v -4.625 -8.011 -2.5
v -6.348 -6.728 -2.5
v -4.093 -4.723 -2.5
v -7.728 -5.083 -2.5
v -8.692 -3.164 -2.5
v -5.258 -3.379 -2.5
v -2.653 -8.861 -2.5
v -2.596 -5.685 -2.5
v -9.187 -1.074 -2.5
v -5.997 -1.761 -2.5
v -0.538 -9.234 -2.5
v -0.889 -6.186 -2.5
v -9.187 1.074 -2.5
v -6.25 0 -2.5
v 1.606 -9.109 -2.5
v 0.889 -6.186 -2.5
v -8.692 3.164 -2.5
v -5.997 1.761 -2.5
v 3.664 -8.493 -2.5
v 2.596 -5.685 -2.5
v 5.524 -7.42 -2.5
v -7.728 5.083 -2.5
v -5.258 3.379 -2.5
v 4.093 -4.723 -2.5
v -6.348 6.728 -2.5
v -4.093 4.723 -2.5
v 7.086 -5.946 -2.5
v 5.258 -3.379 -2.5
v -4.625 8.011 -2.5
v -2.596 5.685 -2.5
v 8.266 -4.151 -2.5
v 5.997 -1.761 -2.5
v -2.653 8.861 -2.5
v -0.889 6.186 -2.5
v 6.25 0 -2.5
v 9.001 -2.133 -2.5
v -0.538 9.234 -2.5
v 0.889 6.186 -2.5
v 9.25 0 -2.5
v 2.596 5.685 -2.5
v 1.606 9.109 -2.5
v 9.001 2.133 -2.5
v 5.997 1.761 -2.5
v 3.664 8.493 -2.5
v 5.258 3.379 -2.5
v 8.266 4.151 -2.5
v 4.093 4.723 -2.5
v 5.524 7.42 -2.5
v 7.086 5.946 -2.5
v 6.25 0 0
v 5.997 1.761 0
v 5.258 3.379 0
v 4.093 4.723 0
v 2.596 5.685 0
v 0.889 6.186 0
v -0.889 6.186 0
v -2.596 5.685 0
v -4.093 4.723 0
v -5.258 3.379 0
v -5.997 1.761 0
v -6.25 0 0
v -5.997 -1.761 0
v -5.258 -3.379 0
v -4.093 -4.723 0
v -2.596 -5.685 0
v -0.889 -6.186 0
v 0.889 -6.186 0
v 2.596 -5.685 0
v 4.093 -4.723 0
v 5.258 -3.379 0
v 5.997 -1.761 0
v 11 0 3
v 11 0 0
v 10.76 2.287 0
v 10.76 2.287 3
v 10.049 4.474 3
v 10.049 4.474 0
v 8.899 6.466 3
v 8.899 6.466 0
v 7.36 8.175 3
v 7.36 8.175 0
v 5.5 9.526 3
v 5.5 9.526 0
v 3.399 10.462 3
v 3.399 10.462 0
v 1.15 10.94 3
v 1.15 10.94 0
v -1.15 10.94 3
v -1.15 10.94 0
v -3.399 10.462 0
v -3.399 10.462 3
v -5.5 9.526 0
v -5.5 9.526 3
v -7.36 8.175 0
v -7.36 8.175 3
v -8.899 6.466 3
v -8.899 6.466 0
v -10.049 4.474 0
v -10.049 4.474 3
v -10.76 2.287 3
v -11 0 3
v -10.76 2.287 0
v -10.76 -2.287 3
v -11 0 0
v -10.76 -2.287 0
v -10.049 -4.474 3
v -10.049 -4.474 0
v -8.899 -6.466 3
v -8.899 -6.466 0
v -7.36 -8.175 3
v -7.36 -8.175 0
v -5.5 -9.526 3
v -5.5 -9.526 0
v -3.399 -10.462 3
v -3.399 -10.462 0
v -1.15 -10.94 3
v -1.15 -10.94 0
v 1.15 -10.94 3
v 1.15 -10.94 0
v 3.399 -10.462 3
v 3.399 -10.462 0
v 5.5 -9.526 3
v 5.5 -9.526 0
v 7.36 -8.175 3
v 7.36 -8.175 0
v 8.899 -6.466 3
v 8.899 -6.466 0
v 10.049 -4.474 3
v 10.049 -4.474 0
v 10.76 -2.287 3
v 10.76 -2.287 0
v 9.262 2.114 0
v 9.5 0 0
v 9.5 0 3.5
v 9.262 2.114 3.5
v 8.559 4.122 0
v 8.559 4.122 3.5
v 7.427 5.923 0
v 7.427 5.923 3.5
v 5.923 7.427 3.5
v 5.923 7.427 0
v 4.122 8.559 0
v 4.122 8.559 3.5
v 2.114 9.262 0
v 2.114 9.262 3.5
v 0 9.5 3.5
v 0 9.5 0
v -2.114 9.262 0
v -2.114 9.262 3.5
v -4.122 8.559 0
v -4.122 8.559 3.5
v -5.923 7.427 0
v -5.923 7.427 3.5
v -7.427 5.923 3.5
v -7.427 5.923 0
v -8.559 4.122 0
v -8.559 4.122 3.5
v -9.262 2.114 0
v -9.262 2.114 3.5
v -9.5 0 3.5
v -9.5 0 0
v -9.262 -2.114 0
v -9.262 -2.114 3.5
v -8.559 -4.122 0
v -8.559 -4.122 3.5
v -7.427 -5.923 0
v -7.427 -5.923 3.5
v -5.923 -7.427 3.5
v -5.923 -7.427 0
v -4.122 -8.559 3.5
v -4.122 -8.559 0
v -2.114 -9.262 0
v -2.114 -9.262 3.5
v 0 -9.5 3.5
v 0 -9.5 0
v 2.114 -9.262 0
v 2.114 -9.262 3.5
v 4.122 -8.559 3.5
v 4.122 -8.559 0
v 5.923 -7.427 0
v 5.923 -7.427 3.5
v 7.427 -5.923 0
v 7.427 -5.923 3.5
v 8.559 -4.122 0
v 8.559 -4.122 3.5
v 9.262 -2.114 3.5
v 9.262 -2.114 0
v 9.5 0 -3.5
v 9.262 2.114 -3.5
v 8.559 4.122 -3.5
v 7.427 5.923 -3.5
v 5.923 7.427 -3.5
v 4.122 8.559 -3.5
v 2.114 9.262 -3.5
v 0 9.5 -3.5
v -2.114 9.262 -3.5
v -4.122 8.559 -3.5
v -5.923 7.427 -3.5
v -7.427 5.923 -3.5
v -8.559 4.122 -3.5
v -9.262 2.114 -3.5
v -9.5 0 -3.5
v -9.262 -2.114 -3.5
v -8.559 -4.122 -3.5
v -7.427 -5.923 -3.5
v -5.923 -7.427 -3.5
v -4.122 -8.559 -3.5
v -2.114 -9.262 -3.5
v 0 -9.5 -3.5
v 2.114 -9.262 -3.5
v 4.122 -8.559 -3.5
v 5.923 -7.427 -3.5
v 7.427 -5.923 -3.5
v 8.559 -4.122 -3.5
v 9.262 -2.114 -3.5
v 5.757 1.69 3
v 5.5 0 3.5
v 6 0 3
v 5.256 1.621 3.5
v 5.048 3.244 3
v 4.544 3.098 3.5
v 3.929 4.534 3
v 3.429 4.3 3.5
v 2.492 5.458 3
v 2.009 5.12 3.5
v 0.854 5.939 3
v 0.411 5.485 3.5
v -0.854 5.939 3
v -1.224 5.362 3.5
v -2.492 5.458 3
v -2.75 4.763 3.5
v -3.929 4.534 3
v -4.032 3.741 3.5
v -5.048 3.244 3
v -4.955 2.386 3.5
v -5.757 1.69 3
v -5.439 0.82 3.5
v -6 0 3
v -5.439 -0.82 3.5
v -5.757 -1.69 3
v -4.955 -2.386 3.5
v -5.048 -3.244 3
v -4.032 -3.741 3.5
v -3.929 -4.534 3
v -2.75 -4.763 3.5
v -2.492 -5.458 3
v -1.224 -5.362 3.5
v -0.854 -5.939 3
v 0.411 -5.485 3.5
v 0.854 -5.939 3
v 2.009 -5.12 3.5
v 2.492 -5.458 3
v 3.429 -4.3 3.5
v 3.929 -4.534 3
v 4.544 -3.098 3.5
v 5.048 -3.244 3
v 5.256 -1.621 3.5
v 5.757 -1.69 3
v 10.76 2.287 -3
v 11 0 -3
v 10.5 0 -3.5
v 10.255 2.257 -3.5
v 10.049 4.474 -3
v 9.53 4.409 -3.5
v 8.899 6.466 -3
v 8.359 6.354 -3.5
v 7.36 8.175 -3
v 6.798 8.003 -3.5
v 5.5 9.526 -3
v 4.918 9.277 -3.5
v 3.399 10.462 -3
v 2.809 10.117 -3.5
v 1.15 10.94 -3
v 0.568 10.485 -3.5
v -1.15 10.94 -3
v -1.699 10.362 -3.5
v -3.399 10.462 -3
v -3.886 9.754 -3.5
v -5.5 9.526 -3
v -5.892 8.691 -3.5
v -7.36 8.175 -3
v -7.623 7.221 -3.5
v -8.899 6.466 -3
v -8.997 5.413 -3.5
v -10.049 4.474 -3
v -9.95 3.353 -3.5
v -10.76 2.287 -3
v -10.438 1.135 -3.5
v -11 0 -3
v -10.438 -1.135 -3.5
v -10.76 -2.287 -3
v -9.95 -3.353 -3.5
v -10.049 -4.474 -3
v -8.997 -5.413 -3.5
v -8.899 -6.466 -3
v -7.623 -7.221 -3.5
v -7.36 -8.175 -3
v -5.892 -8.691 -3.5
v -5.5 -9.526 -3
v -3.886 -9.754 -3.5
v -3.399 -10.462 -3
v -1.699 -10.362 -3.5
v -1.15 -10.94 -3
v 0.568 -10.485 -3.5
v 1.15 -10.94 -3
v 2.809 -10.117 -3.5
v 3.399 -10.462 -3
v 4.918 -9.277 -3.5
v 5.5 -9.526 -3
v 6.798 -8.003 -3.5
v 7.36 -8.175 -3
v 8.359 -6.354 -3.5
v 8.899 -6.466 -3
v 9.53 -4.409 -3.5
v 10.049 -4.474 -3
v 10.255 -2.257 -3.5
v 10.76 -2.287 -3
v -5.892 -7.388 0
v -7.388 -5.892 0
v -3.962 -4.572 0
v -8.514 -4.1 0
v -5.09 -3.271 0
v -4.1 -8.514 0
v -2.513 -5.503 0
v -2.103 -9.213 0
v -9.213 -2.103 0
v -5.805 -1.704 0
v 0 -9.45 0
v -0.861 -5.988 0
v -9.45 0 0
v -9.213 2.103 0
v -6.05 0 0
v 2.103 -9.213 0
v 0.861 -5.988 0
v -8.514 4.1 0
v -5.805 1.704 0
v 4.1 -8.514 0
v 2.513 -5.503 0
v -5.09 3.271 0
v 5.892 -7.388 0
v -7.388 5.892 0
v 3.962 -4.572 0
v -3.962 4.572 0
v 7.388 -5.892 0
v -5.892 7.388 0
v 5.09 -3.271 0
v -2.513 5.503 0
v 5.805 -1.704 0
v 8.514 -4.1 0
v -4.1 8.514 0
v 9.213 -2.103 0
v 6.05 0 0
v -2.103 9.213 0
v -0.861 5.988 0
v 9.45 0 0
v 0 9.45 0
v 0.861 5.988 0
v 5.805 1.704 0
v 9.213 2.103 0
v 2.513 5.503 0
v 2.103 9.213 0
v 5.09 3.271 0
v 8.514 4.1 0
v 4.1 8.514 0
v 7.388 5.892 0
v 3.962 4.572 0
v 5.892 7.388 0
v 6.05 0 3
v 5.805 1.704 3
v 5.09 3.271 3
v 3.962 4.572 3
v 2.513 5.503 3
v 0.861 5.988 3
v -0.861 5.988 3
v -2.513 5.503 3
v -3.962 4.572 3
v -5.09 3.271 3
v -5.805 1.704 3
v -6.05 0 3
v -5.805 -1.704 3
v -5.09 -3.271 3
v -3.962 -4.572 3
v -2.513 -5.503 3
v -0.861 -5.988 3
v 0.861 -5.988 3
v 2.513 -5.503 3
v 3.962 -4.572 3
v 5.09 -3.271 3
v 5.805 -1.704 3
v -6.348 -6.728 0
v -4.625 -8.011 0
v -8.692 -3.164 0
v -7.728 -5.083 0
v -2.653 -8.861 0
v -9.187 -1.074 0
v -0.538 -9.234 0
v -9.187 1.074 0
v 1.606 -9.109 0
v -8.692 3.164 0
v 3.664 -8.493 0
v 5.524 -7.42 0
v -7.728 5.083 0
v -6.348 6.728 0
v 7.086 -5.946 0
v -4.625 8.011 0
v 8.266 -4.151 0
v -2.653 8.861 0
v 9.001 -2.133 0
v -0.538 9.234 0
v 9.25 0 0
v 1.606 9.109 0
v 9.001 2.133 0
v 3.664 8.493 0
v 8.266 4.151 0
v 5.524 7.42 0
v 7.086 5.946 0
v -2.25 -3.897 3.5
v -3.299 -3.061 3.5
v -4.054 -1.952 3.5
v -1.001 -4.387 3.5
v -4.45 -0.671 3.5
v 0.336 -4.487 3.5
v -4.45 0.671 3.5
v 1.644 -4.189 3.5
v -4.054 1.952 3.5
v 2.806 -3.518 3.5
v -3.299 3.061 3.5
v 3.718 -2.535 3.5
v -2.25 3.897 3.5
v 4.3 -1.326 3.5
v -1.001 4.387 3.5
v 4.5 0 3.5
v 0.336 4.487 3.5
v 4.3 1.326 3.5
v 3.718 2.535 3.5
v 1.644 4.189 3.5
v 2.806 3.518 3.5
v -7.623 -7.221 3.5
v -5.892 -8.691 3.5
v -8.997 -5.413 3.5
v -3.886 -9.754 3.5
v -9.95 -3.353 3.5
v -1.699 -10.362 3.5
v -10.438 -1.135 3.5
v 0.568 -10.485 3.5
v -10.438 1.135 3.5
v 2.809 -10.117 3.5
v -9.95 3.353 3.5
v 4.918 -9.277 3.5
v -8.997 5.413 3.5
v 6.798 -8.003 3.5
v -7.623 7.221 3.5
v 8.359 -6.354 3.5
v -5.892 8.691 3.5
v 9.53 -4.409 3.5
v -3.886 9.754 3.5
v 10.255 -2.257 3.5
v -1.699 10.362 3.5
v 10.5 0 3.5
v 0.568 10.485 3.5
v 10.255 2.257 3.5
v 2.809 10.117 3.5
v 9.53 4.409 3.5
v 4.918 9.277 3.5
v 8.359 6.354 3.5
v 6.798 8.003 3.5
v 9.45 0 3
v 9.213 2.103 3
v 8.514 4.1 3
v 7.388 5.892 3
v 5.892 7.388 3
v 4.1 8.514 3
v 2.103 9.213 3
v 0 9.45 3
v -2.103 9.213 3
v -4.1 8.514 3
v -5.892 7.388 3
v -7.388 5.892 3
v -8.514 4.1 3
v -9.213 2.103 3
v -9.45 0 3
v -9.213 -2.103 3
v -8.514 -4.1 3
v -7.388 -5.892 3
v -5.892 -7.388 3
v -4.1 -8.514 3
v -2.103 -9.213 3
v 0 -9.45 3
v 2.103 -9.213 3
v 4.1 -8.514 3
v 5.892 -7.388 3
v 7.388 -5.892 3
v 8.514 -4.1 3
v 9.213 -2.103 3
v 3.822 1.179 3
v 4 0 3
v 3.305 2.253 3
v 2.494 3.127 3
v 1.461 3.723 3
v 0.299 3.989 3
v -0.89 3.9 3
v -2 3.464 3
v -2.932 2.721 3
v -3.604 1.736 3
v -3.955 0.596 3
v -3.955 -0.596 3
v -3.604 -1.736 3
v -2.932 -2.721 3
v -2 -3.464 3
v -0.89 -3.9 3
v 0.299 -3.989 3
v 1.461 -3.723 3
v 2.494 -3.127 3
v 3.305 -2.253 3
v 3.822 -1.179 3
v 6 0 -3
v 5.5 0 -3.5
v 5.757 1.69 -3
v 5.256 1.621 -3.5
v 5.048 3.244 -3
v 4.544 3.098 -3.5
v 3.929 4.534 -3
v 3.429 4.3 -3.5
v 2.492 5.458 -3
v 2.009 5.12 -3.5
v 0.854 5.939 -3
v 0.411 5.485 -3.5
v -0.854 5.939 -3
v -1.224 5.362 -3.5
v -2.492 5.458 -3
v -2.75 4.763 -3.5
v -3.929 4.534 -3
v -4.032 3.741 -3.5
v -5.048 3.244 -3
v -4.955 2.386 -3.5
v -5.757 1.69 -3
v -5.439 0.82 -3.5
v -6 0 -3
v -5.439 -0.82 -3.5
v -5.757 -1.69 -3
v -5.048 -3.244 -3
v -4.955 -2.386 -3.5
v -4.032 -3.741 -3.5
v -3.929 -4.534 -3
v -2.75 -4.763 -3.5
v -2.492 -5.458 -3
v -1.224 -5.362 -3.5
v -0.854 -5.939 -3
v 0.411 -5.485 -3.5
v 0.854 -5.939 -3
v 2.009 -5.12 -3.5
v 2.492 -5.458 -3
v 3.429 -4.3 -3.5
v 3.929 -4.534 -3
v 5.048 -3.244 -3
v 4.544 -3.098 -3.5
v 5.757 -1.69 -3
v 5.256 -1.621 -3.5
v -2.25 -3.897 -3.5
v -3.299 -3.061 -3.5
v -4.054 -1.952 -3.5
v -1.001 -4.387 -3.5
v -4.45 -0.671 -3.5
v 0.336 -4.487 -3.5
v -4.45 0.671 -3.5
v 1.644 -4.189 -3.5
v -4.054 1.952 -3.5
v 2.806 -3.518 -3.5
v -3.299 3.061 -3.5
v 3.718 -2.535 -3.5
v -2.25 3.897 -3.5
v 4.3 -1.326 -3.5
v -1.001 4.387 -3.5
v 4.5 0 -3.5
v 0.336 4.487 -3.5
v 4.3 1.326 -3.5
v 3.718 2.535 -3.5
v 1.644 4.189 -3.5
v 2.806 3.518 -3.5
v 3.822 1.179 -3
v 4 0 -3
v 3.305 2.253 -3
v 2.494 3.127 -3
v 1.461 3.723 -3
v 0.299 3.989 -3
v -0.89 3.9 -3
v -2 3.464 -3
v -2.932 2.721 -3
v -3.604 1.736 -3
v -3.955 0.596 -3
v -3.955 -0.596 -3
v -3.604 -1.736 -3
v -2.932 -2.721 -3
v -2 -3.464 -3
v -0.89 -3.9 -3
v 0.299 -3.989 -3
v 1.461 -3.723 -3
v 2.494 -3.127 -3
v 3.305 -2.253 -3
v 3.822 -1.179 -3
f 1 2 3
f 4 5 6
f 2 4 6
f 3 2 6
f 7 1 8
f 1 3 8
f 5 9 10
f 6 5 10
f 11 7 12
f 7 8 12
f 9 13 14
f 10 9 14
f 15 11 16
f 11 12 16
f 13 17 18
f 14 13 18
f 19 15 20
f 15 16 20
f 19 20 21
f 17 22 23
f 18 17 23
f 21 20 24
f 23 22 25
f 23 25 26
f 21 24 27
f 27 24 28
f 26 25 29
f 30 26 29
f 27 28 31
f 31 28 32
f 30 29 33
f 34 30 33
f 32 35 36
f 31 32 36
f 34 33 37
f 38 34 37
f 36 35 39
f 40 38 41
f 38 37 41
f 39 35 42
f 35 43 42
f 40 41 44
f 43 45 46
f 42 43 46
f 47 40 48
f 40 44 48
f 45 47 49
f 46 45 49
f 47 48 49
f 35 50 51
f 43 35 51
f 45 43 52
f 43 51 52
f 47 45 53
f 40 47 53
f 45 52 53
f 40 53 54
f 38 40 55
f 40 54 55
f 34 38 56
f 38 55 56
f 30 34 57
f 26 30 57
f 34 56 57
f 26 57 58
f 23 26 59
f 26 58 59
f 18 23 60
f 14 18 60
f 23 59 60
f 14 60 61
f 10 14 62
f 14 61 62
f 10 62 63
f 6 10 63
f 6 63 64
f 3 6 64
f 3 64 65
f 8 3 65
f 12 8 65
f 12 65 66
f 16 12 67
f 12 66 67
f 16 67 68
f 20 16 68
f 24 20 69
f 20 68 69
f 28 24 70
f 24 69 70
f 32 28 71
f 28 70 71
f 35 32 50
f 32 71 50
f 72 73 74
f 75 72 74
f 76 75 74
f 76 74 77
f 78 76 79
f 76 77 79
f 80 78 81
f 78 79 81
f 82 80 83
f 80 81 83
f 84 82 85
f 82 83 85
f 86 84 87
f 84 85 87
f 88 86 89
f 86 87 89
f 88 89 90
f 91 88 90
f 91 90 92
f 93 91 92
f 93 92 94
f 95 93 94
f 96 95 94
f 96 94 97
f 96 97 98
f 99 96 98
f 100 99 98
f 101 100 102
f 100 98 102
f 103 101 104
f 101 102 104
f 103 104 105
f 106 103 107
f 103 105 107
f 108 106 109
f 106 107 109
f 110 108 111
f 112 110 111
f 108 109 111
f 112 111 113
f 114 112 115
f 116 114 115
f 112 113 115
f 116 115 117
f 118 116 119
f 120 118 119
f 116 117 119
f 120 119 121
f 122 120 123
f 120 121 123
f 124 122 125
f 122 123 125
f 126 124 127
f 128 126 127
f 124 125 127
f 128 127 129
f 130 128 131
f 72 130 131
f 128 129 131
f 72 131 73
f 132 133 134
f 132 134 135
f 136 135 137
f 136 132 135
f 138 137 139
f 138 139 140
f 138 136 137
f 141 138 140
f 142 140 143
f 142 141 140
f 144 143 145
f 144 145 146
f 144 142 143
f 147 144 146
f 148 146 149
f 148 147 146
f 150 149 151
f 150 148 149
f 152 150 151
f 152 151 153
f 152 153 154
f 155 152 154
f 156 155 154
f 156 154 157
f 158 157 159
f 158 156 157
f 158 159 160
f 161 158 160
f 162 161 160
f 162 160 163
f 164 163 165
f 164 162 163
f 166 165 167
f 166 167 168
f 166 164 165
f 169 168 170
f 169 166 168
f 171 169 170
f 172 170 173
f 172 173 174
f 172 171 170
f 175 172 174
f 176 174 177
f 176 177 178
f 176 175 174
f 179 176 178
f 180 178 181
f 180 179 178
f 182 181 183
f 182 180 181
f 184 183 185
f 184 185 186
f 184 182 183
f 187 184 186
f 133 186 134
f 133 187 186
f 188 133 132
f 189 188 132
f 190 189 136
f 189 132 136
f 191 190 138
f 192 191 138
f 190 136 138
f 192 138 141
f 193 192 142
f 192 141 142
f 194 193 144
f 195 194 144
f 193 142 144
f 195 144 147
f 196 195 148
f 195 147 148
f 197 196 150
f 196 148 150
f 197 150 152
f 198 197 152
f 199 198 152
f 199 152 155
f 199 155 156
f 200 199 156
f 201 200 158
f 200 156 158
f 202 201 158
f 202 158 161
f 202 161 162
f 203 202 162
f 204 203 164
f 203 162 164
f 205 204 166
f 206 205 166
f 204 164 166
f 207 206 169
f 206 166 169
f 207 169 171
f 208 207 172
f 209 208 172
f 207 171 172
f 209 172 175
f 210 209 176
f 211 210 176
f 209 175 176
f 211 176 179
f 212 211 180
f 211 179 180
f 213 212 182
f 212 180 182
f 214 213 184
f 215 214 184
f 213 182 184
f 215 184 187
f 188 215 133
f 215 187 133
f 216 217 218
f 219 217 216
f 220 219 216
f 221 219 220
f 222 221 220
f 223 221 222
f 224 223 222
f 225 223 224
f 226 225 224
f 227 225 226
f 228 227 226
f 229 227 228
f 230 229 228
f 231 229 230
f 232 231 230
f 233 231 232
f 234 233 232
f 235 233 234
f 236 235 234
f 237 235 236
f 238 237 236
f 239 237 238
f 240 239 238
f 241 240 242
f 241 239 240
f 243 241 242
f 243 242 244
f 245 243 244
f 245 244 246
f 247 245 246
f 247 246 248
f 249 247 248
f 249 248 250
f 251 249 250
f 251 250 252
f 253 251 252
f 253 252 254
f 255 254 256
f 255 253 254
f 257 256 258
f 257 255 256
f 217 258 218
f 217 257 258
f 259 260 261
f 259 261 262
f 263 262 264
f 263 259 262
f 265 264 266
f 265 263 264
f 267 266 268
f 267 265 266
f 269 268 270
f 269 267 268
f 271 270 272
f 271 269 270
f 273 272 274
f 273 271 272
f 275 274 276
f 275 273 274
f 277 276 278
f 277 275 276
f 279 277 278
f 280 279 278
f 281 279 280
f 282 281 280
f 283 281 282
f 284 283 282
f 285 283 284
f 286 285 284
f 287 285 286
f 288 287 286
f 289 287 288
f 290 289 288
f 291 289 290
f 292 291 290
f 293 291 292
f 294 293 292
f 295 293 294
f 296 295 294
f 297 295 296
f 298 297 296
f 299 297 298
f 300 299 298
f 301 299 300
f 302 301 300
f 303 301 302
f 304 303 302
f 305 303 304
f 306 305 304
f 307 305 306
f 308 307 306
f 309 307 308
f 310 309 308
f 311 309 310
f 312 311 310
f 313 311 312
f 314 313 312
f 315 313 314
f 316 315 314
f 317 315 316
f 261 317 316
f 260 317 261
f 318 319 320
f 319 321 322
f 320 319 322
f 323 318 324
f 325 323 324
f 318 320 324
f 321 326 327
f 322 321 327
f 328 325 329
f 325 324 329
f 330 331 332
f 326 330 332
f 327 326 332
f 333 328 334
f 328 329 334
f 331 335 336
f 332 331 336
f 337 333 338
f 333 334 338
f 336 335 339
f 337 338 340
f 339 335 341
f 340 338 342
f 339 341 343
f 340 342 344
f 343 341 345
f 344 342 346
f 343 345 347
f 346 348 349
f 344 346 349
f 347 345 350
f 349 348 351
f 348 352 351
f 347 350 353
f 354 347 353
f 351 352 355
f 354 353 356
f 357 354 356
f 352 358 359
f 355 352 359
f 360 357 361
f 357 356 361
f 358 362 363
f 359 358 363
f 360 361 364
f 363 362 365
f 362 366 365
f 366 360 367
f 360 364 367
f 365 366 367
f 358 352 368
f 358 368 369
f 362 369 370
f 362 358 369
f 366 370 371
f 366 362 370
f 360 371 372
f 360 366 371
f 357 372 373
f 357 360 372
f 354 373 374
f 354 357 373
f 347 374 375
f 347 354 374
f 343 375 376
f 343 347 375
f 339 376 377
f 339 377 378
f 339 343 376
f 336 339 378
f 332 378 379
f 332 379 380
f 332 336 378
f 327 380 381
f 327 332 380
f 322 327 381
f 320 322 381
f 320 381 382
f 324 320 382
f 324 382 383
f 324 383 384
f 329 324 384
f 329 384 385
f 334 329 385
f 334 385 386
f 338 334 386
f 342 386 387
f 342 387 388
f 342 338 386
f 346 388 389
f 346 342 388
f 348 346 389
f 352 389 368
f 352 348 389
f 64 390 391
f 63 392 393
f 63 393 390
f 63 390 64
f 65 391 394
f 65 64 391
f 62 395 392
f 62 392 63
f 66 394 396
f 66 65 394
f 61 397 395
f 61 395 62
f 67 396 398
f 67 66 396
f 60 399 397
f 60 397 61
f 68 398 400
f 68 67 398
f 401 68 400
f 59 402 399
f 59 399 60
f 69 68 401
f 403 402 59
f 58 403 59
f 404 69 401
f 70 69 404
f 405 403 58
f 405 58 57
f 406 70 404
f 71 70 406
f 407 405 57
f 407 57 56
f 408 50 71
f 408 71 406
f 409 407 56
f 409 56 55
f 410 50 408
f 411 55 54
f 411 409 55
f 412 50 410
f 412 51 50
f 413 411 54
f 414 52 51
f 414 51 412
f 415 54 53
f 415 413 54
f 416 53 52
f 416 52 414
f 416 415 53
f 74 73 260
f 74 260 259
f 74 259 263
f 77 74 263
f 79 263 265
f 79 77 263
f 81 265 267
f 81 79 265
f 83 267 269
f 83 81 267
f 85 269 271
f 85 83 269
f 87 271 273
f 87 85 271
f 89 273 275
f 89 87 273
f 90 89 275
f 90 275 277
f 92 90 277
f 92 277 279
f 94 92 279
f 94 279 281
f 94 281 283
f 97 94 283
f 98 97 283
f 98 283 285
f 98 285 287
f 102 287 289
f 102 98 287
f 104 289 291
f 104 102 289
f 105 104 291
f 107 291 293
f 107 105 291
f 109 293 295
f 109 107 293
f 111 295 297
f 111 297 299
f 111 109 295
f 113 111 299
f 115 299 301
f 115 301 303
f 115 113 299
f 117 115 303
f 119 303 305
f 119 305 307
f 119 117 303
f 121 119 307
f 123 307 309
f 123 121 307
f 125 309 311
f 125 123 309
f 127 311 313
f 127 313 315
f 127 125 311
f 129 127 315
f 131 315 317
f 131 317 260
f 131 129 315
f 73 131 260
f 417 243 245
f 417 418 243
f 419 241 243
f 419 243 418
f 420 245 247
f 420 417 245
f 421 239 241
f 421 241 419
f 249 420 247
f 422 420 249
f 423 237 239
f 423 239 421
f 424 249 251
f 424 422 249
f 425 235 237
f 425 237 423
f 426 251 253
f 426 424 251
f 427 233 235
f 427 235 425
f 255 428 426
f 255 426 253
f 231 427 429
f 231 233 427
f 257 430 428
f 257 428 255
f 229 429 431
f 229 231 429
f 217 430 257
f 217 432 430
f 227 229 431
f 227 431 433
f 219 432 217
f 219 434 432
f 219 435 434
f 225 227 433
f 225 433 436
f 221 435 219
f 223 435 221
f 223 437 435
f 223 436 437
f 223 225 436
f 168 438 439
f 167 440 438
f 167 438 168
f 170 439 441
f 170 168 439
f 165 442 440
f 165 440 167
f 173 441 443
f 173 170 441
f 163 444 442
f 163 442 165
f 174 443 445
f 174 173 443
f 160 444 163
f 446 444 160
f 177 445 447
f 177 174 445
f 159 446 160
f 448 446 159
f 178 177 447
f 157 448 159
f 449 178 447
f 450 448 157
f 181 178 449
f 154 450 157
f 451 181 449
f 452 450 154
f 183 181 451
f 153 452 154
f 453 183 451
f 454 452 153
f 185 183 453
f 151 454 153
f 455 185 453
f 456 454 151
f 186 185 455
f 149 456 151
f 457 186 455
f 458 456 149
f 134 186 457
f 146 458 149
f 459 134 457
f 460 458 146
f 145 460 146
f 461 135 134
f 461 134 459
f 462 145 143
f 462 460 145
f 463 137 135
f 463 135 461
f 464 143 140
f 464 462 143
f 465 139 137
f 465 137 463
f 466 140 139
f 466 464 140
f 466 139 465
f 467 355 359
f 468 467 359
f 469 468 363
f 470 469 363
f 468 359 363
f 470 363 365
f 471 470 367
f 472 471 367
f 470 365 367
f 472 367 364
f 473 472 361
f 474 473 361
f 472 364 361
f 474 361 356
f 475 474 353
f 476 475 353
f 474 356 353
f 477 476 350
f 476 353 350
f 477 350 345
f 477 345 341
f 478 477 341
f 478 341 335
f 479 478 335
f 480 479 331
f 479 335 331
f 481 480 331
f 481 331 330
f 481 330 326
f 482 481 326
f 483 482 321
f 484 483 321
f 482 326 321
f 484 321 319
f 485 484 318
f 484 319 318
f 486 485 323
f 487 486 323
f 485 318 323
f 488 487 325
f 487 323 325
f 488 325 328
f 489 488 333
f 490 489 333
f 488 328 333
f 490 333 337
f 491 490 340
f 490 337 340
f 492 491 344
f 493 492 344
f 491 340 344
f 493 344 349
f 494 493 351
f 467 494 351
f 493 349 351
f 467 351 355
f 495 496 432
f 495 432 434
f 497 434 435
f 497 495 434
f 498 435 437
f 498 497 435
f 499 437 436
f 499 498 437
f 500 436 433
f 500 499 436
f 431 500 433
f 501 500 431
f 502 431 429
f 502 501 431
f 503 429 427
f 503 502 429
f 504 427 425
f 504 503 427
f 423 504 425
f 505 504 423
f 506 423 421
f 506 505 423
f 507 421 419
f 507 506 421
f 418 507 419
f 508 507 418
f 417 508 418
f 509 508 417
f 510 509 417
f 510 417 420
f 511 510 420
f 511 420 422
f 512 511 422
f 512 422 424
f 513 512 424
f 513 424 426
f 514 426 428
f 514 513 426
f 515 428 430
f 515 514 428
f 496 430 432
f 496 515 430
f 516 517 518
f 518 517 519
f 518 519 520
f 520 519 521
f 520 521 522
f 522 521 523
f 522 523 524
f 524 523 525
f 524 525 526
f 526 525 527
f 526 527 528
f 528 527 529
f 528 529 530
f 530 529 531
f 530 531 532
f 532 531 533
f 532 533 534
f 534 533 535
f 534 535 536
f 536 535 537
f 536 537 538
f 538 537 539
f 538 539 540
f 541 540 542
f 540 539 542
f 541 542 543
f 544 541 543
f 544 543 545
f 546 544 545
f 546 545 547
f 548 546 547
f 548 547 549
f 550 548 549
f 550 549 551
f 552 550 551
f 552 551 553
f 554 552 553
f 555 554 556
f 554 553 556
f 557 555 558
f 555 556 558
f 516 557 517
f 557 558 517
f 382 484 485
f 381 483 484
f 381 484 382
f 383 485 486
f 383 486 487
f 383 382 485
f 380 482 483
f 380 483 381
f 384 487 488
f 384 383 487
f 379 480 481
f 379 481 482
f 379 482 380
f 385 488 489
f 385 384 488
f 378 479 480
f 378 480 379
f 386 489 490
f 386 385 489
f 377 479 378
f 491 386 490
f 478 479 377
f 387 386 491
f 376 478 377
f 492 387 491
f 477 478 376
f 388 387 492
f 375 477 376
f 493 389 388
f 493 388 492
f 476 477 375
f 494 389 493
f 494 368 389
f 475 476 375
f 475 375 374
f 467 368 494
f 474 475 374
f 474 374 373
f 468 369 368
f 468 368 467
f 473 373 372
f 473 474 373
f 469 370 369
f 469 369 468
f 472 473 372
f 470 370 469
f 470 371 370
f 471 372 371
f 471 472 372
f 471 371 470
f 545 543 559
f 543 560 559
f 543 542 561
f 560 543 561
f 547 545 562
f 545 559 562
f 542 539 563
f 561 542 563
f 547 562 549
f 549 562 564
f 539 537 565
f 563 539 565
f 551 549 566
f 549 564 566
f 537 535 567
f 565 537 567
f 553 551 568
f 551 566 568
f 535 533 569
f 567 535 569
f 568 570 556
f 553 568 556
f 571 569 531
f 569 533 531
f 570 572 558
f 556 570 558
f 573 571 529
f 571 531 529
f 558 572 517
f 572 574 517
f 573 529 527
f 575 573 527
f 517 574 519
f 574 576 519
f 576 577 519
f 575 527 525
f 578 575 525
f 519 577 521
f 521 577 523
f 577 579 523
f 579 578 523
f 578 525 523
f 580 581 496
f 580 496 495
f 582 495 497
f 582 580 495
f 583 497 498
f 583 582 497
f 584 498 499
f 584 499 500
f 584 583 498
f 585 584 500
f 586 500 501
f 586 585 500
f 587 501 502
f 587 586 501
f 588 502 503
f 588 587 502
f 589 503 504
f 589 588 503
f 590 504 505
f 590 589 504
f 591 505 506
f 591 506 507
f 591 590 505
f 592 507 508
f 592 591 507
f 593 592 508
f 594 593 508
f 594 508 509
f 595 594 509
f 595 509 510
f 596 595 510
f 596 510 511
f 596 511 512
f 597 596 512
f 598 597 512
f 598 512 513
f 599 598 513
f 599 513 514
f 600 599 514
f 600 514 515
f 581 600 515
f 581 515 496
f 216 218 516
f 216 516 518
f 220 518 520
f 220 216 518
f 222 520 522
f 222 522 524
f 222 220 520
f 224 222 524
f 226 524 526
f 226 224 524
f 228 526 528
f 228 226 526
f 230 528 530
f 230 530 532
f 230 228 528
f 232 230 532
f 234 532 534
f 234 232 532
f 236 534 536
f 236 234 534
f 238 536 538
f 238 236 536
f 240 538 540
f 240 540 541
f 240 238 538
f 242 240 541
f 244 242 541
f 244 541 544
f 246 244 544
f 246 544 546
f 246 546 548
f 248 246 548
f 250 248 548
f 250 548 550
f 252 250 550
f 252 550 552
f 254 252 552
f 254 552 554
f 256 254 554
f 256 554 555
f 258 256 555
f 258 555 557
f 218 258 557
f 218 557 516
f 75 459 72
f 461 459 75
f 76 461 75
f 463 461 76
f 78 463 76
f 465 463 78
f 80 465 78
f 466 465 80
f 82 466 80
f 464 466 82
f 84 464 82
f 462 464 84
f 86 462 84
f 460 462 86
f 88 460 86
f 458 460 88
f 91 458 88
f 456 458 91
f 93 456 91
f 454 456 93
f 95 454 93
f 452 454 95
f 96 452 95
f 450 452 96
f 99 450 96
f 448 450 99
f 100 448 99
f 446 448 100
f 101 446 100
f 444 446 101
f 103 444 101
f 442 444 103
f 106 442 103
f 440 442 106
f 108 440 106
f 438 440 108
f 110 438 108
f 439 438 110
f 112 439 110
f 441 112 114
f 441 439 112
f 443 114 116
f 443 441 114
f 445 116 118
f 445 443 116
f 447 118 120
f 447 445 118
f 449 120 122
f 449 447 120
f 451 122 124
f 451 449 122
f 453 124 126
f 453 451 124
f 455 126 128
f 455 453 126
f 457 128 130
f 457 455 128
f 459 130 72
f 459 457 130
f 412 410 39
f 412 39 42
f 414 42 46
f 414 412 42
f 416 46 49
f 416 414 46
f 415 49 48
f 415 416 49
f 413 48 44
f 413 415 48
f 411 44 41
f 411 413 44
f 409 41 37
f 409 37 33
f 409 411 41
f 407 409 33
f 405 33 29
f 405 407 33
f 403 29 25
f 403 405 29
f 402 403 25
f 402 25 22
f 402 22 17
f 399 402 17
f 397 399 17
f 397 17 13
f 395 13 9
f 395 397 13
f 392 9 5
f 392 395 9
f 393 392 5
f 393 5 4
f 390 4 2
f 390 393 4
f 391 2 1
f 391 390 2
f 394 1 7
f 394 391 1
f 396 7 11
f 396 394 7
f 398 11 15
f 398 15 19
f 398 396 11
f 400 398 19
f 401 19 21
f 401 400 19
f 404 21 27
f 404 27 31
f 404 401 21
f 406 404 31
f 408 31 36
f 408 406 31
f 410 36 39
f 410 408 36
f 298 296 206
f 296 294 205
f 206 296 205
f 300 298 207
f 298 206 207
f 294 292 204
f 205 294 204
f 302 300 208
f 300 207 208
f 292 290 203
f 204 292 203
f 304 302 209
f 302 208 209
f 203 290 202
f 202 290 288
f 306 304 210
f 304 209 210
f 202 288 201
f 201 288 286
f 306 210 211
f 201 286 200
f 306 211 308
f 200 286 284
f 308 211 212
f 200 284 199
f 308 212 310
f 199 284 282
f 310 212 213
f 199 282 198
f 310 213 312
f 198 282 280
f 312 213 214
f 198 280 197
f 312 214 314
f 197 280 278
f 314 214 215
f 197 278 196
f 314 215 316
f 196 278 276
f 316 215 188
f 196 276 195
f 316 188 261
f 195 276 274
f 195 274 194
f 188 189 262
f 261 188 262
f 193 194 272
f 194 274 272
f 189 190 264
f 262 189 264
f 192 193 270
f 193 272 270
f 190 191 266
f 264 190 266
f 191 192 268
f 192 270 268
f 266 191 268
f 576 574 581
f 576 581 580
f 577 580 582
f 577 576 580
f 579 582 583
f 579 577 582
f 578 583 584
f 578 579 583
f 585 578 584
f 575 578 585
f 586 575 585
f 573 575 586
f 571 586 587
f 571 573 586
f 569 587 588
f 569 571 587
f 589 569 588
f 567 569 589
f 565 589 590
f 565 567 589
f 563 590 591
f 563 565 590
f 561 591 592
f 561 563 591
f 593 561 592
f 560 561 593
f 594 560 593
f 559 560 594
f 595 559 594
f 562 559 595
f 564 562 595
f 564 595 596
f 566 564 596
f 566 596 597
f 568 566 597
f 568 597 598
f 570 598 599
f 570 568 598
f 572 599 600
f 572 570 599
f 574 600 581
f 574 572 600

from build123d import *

# Parameters (mm, degrees)
F0_R     = 11
F0_R_2   = 9.5
F0_R_3   = 6
F0_R_4   = 4
F1_DEPTH = 3.5
F2_R     = 9.25
F2_R_2   = 6.25
F3_DEPTH = 2.5
F4_R     = 9.45
F4_R_2   = 6.05
F5_DEPTH = 3
F6_SIZE  = 0.5


with BuildPart() as f1:
    # F0 (on Top) → F1 (new body, symmetric)
    with BuildSketch(Plane.XY):
        Circle(F0_R)
        Circle(F0_R_2, mode=Mode.SUBTRACT)
        Circle(F0_R_3)
        Circle(F0_R_4, mode=Mode.SUBTRACT)
    extrude(amount=F1_DEPTH, both=True)

    # F6
    f6_edges = [f1.edges().sort_by_distance(p)[0] for p in [
        (-11, 0, 3.5),
        (-11, 0, -3.5),
        (-6, 0, 3.5),
        (-4, 0, 3.5),
        (-6, 0, -3.5),
        (-4, 0, -3.5),
    ]]
    chamfer(f6_edges, length=F6_SIZE)


with BuildPart() as f3:
    # F2 (on Top) → F3 (new body)
    with BuildSketch(Plane.XY):
        Circle(F2_R)
        Circle(F2_R_2, mode=Mode.SUBTRACT)
    extrude(amount=-F3_DEPTH)


with BuildPart() as f5:
    # F4 (on Top) → F5 (new body)
    with BuildSketch(Plane.XY):
        Circle(F4_R)
        Circle(F4_R_2, mode=Mode.SUBTRACT)
    extrude(amount=F5_DEPTH)


solid = Compound([f1.part, f3.part, f5.part])
